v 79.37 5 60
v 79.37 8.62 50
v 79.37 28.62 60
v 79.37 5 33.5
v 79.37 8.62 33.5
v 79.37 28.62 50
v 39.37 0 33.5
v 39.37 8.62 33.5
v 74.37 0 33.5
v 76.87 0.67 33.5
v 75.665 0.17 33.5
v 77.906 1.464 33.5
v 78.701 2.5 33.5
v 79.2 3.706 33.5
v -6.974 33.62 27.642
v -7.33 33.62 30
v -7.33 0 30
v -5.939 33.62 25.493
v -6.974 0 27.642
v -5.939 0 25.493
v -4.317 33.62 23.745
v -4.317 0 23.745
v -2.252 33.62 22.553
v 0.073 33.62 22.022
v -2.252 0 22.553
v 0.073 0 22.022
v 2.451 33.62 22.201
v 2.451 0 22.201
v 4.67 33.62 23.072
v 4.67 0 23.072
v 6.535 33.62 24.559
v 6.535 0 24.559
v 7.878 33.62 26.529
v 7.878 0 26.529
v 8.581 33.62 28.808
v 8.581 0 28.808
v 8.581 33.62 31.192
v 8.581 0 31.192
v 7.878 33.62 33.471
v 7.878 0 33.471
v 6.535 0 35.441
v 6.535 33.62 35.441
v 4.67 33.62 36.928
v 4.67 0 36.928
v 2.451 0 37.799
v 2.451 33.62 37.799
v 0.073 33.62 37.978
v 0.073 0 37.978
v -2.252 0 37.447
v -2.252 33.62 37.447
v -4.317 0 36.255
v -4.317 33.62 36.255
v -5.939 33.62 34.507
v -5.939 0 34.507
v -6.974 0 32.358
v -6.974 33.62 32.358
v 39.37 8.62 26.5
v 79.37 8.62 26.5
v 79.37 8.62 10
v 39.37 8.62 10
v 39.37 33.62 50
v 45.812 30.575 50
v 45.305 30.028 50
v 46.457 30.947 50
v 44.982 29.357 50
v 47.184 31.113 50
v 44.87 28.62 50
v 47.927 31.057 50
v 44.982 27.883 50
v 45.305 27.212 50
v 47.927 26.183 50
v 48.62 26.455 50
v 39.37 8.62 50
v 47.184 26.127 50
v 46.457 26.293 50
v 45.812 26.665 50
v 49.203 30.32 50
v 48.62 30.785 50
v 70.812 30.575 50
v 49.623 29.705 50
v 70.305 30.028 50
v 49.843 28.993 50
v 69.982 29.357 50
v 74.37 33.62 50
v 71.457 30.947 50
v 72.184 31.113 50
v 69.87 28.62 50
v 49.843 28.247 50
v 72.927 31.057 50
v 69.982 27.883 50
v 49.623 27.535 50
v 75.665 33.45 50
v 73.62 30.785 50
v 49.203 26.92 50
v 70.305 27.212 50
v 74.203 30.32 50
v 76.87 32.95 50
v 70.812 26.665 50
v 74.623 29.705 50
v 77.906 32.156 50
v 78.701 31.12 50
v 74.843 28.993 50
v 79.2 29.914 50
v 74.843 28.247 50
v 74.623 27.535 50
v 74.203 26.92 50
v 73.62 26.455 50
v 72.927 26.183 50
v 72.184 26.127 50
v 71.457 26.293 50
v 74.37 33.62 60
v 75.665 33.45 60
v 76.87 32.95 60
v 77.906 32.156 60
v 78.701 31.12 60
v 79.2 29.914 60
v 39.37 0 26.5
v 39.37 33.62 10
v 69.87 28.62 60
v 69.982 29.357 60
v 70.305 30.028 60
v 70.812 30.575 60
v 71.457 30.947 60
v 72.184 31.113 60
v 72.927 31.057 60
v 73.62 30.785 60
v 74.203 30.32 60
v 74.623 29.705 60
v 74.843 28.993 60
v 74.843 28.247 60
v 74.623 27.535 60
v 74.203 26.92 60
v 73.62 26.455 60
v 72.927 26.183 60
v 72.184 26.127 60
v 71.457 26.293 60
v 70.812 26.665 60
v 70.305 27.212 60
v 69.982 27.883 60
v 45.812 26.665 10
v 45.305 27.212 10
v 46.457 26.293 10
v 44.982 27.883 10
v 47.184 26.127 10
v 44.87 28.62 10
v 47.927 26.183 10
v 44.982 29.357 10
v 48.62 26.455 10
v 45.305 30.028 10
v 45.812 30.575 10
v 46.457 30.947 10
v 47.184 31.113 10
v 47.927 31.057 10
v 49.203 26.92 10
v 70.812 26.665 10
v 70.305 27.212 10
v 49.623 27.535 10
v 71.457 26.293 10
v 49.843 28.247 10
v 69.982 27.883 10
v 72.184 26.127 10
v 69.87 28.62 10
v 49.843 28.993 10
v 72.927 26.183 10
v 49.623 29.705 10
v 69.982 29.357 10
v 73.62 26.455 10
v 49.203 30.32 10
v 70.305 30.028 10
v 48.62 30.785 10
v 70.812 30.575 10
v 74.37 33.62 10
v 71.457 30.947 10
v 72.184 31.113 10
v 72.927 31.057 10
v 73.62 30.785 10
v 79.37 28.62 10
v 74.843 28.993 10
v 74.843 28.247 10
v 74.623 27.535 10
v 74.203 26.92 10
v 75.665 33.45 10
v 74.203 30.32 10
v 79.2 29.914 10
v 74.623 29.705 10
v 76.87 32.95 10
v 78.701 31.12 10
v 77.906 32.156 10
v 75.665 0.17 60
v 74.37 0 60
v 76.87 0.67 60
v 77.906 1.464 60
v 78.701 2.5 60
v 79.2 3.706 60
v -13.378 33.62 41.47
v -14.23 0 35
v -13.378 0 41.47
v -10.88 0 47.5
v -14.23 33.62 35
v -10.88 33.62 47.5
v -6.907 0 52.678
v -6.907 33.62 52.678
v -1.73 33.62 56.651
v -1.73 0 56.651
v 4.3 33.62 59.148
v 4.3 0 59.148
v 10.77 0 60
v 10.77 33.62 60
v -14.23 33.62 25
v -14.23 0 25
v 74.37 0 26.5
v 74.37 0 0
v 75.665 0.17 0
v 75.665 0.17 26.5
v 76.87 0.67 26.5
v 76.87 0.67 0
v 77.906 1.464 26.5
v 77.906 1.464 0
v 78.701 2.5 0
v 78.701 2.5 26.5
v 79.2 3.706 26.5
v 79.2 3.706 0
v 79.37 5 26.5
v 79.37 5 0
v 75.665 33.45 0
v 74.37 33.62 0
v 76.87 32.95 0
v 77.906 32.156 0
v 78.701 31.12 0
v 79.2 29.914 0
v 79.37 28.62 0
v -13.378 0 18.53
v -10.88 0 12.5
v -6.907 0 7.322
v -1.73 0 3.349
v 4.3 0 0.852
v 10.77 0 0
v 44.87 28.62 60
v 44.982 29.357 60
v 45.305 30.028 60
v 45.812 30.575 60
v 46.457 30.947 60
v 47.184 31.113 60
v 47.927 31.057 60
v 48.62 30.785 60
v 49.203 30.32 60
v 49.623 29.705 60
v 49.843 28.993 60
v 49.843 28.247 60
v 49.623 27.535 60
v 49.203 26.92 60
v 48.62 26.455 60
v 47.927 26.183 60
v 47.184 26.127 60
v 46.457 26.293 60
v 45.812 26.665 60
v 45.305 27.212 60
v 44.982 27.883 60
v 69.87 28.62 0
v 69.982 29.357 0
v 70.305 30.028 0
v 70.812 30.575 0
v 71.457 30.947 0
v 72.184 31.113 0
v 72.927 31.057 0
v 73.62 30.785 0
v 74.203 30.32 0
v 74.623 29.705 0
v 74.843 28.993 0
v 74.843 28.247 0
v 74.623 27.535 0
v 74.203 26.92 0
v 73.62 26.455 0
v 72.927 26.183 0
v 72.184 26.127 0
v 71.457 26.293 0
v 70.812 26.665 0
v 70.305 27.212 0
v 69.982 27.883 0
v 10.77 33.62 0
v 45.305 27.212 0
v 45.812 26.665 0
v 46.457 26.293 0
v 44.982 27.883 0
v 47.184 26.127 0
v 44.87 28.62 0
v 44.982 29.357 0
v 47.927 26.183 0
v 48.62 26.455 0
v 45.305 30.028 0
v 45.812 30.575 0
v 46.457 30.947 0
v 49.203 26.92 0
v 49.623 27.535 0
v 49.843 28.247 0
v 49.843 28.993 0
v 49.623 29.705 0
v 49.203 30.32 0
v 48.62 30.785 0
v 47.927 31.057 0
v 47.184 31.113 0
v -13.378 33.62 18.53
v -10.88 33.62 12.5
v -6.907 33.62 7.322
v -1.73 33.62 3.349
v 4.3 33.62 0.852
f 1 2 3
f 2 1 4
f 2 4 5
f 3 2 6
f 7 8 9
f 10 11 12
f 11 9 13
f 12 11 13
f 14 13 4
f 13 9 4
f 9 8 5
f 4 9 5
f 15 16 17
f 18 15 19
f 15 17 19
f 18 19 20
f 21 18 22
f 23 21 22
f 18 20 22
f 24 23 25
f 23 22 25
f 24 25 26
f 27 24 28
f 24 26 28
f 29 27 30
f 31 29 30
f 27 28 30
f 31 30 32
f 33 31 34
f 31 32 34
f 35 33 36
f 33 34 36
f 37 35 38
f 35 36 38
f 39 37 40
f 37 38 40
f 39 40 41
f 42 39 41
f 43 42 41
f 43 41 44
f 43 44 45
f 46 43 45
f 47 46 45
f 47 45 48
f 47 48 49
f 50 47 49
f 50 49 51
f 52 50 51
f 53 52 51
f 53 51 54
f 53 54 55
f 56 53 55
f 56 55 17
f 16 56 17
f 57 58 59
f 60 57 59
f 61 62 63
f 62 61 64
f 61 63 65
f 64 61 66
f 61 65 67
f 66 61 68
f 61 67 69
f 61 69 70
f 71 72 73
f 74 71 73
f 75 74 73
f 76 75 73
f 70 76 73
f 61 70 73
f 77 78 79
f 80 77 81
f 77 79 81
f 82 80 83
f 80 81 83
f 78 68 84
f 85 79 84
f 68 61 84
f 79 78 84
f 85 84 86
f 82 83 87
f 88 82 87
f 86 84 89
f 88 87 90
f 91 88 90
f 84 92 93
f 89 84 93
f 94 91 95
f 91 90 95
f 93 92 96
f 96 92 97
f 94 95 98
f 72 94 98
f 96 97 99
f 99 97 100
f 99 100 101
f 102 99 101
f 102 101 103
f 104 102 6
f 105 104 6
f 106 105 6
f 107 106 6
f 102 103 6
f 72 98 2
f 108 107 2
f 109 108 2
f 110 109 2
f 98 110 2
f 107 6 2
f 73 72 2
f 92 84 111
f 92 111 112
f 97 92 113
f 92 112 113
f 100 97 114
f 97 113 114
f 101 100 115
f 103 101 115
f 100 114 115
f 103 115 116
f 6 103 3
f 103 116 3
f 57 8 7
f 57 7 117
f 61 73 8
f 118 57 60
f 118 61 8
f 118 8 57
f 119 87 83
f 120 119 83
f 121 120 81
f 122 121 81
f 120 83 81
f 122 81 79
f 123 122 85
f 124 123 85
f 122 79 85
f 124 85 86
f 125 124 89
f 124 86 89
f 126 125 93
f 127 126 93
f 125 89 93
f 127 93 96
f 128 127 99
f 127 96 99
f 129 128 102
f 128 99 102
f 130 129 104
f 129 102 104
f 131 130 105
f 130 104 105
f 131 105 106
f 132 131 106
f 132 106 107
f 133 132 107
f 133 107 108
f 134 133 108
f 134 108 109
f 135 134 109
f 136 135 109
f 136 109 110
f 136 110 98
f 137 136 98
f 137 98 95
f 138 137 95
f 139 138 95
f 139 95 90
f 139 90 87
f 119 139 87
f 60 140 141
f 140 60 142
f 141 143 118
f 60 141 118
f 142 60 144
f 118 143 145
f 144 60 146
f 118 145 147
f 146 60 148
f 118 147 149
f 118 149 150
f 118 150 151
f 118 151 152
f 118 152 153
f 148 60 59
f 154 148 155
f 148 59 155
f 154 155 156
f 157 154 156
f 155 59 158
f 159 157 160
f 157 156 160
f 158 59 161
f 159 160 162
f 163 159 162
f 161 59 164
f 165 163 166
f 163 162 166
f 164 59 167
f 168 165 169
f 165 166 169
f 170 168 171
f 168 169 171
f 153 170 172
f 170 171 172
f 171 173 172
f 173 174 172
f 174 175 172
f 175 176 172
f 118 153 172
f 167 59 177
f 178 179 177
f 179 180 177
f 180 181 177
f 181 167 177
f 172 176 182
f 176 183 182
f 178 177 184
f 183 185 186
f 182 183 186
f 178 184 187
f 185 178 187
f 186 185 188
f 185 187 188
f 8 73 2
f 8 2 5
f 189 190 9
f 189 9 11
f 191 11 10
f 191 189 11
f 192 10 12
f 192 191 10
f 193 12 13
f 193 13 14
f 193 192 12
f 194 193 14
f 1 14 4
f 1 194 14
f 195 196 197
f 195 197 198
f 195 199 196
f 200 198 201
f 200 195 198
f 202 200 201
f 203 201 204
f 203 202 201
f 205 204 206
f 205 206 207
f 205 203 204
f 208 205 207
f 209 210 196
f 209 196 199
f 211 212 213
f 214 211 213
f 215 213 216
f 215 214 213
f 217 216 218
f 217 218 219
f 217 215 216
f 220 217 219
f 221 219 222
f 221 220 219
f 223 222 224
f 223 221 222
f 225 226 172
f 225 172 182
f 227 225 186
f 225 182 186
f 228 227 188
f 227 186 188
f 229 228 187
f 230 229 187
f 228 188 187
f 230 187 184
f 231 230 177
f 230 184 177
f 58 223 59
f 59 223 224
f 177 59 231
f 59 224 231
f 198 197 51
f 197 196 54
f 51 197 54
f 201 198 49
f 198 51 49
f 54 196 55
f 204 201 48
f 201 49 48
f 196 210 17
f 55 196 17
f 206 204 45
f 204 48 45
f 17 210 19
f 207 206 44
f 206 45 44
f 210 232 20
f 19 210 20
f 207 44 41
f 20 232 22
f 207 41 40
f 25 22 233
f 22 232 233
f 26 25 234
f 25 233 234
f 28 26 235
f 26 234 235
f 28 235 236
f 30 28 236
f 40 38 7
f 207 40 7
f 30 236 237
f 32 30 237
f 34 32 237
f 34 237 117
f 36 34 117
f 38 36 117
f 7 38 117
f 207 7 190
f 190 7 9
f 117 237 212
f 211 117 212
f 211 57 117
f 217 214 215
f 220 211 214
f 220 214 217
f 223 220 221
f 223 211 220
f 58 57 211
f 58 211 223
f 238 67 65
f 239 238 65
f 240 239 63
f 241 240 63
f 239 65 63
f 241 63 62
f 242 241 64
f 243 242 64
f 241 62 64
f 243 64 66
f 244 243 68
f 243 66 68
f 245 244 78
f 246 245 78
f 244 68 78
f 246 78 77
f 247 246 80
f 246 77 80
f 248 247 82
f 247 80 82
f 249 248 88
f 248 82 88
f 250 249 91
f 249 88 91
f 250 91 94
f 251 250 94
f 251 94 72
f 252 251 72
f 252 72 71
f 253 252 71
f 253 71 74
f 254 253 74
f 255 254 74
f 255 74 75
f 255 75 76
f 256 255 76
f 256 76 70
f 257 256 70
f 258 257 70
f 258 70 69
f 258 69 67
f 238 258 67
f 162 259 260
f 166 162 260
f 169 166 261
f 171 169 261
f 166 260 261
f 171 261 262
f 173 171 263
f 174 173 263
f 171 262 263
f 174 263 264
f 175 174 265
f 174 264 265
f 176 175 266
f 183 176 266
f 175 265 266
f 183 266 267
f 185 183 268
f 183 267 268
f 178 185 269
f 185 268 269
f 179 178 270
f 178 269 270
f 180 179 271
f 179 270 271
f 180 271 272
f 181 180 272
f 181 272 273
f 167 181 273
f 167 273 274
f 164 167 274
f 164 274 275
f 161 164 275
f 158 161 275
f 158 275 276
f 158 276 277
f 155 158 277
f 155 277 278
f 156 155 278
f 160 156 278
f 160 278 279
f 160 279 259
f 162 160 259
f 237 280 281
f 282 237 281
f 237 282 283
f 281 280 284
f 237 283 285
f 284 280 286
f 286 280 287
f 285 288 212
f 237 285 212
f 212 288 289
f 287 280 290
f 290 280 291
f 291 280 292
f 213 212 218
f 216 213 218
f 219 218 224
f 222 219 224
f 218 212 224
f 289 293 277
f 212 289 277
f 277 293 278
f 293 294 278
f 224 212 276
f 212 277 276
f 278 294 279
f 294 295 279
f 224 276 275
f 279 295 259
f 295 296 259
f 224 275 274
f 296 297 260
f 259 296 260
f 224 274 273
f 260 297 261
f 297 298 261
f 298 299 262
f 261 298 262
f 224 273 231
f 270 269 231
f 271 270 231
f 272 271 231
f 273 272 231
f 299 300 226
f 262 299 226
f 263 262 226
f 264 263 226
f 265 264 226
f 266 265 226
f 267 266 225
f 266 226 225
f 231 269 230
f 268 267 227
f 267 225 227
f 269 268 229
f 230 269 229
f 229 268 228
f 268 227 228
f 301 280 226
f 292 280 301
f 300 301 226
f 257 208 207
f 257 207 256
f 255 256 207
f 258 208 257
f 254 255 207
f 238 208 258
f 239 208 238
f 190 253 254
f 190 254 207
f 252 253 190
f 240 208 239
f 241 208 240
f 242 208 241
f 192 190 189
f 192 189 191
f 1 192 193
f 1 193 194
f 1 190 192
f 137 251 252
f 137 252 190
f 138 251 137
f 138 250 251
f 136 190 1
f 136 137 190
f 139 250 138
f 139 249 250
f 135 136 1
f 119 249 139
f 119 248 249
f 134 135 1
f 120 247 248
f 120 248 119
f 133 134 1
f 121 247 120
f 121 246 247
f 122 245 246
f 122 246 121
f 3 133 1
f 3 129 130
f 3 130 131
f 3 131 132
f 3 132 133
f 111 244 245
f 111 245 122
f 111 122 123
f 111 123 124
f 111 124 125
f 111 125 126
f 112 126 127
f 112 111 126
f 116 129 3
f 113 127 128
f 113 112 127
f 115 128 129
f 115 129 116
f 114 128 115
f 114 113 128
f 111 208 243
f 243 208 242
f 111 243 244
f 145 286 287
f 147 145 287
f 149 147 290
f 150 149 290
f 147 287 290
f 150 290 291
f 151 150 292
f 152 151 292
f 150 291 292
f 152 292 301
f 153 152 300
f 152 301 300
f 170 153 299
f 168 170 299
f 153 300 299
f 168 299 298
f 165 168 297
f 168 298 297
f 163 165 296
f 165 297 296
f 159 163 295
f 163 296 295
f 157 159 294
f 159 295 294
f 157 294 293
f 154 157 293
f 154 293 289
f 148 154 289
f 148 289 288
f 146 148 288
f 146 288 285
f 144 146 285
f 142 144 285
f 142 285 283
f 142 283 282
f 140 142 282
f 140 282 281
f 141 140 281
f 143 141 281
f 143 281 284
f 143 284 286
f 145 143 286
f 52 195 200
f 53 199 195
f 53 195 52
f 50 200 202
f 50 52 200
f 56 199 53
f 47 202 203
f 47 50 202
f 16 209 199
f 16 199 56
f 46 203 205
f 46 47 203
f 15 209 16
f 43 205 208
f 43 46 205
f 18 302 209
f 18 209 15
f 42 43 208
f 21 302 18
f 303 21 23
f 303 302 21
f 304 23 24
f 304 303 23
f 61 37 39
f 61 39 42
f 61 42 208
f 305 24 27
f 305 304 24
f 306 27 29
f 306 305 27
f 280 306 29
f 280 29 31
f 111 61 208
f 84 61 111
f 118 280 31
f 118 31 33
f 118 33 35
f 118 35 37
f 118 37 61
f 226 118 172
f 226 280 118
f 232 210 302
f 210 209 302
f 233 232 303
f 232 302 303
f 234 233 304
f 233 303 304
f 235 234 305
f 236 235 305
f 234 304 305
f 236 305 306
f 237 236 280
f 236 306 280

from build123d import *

# Parameters (mm, degrees)
SKETCH1_W                  = 93.6
SKETCH1_H                  = 33.62
BOSS_EXTRUDE2_DEPTH        = 60
CUT_EXTRUDE2_DEPTH         = 40
FILLET2_R                  = 25
F_16_0_16_DIAMETER_HOLE2_D = 16
FILLET3_R                  = 5
SKETCH13_W                 = 40
SKETCH13_H                 = 7
CUT_EXTRUDE3_DEPTH         = 103.58979849
F_5_0_5_DIAMETER_HOLE1_D   = 5


with BuildPart() as part:
    # Sketch1 → Boss-Extrude2 (new body)
    with BuildSketch(Plane.XY):
        with Locations((32.570440053, 16.81)):
            Rectangle(SKETCH1_W, SKETCH1_H)
    extrude(amount=BOSS_EXTRUDE2_DEPTH)

    # Sketch8 → Cut-Extrude2 (cut)
    with BuildSketch(Plane(origin=(79.370440053, 0, 0), x_dir=(0, 0, -1), z_dir=(1, 0, 0))):
        Polygon((-30, 8.62), (-10, 8.62), (-10, 33.62), (-50, 33.62), (-50, 8.62), align=None)
    extrude(amount=-CUT_EXTRUDE2_DEPTH, mode=Mode.SUBTRACT)

    # Fillet2
    fillet2_edges = [part.edges().sort_by_distance(p)[0] for p in [
        (-14.229559947, 16.81, 60),
        (-14.229559947, 16.81, 0),
    ]]
    fillet(fillet2_edges, radius=FILLET2_R)

    # Ø16.0 (16) Diameter Hole2 (through all)
    with Locations(Plane(origin=(0.670440053, 33.62, 30), x_dir=(1, 0, 0), z_dir=(0, 1, 0))):
        with Locations((0, 0)):
            Hole(F_16_0_16_DIAMETER_HOLE2_D / 2)

    # Fillet3
    fillet3_edges = [part.edges().sort_by_distance(p)[0] for p in [
        (79.370440053, 33.62, 5),
        (79.370440053, 33.62, 55),
        (79.370440053, 0, 30),
    ]]
    fillet(fillet3_edges, radius=FILLET3_R)

    # Sketch13 → Cut-Extrude3 (cut, through all)
    with BuildSketch(Plane(origin=(0, 8.62, 0), x_dir=(1, 0, 0), z_dir=(0, 1, 0))):
        with Locations((59.370440053, -30)):
            Rectangle(SKETCH13_W, SKETCH13_H)
    extrude(amount=-CUT_EXTRUDE3_DEPTH, mode=Mode.SUBTRACT)

    # Ø5.0 (5) Diameter Hole1 (through all)
    with Locations(Plane(origin=(72.370440053, 28.62, 60), x_dir=(1, 0, 0), z_dir=(0, 0, 1))):
        with Locations((0, 0), (-25, 0)):
            Hole(F_5_0_5_DIAMETER_HOLE1_D / 2)


solid = part.part
